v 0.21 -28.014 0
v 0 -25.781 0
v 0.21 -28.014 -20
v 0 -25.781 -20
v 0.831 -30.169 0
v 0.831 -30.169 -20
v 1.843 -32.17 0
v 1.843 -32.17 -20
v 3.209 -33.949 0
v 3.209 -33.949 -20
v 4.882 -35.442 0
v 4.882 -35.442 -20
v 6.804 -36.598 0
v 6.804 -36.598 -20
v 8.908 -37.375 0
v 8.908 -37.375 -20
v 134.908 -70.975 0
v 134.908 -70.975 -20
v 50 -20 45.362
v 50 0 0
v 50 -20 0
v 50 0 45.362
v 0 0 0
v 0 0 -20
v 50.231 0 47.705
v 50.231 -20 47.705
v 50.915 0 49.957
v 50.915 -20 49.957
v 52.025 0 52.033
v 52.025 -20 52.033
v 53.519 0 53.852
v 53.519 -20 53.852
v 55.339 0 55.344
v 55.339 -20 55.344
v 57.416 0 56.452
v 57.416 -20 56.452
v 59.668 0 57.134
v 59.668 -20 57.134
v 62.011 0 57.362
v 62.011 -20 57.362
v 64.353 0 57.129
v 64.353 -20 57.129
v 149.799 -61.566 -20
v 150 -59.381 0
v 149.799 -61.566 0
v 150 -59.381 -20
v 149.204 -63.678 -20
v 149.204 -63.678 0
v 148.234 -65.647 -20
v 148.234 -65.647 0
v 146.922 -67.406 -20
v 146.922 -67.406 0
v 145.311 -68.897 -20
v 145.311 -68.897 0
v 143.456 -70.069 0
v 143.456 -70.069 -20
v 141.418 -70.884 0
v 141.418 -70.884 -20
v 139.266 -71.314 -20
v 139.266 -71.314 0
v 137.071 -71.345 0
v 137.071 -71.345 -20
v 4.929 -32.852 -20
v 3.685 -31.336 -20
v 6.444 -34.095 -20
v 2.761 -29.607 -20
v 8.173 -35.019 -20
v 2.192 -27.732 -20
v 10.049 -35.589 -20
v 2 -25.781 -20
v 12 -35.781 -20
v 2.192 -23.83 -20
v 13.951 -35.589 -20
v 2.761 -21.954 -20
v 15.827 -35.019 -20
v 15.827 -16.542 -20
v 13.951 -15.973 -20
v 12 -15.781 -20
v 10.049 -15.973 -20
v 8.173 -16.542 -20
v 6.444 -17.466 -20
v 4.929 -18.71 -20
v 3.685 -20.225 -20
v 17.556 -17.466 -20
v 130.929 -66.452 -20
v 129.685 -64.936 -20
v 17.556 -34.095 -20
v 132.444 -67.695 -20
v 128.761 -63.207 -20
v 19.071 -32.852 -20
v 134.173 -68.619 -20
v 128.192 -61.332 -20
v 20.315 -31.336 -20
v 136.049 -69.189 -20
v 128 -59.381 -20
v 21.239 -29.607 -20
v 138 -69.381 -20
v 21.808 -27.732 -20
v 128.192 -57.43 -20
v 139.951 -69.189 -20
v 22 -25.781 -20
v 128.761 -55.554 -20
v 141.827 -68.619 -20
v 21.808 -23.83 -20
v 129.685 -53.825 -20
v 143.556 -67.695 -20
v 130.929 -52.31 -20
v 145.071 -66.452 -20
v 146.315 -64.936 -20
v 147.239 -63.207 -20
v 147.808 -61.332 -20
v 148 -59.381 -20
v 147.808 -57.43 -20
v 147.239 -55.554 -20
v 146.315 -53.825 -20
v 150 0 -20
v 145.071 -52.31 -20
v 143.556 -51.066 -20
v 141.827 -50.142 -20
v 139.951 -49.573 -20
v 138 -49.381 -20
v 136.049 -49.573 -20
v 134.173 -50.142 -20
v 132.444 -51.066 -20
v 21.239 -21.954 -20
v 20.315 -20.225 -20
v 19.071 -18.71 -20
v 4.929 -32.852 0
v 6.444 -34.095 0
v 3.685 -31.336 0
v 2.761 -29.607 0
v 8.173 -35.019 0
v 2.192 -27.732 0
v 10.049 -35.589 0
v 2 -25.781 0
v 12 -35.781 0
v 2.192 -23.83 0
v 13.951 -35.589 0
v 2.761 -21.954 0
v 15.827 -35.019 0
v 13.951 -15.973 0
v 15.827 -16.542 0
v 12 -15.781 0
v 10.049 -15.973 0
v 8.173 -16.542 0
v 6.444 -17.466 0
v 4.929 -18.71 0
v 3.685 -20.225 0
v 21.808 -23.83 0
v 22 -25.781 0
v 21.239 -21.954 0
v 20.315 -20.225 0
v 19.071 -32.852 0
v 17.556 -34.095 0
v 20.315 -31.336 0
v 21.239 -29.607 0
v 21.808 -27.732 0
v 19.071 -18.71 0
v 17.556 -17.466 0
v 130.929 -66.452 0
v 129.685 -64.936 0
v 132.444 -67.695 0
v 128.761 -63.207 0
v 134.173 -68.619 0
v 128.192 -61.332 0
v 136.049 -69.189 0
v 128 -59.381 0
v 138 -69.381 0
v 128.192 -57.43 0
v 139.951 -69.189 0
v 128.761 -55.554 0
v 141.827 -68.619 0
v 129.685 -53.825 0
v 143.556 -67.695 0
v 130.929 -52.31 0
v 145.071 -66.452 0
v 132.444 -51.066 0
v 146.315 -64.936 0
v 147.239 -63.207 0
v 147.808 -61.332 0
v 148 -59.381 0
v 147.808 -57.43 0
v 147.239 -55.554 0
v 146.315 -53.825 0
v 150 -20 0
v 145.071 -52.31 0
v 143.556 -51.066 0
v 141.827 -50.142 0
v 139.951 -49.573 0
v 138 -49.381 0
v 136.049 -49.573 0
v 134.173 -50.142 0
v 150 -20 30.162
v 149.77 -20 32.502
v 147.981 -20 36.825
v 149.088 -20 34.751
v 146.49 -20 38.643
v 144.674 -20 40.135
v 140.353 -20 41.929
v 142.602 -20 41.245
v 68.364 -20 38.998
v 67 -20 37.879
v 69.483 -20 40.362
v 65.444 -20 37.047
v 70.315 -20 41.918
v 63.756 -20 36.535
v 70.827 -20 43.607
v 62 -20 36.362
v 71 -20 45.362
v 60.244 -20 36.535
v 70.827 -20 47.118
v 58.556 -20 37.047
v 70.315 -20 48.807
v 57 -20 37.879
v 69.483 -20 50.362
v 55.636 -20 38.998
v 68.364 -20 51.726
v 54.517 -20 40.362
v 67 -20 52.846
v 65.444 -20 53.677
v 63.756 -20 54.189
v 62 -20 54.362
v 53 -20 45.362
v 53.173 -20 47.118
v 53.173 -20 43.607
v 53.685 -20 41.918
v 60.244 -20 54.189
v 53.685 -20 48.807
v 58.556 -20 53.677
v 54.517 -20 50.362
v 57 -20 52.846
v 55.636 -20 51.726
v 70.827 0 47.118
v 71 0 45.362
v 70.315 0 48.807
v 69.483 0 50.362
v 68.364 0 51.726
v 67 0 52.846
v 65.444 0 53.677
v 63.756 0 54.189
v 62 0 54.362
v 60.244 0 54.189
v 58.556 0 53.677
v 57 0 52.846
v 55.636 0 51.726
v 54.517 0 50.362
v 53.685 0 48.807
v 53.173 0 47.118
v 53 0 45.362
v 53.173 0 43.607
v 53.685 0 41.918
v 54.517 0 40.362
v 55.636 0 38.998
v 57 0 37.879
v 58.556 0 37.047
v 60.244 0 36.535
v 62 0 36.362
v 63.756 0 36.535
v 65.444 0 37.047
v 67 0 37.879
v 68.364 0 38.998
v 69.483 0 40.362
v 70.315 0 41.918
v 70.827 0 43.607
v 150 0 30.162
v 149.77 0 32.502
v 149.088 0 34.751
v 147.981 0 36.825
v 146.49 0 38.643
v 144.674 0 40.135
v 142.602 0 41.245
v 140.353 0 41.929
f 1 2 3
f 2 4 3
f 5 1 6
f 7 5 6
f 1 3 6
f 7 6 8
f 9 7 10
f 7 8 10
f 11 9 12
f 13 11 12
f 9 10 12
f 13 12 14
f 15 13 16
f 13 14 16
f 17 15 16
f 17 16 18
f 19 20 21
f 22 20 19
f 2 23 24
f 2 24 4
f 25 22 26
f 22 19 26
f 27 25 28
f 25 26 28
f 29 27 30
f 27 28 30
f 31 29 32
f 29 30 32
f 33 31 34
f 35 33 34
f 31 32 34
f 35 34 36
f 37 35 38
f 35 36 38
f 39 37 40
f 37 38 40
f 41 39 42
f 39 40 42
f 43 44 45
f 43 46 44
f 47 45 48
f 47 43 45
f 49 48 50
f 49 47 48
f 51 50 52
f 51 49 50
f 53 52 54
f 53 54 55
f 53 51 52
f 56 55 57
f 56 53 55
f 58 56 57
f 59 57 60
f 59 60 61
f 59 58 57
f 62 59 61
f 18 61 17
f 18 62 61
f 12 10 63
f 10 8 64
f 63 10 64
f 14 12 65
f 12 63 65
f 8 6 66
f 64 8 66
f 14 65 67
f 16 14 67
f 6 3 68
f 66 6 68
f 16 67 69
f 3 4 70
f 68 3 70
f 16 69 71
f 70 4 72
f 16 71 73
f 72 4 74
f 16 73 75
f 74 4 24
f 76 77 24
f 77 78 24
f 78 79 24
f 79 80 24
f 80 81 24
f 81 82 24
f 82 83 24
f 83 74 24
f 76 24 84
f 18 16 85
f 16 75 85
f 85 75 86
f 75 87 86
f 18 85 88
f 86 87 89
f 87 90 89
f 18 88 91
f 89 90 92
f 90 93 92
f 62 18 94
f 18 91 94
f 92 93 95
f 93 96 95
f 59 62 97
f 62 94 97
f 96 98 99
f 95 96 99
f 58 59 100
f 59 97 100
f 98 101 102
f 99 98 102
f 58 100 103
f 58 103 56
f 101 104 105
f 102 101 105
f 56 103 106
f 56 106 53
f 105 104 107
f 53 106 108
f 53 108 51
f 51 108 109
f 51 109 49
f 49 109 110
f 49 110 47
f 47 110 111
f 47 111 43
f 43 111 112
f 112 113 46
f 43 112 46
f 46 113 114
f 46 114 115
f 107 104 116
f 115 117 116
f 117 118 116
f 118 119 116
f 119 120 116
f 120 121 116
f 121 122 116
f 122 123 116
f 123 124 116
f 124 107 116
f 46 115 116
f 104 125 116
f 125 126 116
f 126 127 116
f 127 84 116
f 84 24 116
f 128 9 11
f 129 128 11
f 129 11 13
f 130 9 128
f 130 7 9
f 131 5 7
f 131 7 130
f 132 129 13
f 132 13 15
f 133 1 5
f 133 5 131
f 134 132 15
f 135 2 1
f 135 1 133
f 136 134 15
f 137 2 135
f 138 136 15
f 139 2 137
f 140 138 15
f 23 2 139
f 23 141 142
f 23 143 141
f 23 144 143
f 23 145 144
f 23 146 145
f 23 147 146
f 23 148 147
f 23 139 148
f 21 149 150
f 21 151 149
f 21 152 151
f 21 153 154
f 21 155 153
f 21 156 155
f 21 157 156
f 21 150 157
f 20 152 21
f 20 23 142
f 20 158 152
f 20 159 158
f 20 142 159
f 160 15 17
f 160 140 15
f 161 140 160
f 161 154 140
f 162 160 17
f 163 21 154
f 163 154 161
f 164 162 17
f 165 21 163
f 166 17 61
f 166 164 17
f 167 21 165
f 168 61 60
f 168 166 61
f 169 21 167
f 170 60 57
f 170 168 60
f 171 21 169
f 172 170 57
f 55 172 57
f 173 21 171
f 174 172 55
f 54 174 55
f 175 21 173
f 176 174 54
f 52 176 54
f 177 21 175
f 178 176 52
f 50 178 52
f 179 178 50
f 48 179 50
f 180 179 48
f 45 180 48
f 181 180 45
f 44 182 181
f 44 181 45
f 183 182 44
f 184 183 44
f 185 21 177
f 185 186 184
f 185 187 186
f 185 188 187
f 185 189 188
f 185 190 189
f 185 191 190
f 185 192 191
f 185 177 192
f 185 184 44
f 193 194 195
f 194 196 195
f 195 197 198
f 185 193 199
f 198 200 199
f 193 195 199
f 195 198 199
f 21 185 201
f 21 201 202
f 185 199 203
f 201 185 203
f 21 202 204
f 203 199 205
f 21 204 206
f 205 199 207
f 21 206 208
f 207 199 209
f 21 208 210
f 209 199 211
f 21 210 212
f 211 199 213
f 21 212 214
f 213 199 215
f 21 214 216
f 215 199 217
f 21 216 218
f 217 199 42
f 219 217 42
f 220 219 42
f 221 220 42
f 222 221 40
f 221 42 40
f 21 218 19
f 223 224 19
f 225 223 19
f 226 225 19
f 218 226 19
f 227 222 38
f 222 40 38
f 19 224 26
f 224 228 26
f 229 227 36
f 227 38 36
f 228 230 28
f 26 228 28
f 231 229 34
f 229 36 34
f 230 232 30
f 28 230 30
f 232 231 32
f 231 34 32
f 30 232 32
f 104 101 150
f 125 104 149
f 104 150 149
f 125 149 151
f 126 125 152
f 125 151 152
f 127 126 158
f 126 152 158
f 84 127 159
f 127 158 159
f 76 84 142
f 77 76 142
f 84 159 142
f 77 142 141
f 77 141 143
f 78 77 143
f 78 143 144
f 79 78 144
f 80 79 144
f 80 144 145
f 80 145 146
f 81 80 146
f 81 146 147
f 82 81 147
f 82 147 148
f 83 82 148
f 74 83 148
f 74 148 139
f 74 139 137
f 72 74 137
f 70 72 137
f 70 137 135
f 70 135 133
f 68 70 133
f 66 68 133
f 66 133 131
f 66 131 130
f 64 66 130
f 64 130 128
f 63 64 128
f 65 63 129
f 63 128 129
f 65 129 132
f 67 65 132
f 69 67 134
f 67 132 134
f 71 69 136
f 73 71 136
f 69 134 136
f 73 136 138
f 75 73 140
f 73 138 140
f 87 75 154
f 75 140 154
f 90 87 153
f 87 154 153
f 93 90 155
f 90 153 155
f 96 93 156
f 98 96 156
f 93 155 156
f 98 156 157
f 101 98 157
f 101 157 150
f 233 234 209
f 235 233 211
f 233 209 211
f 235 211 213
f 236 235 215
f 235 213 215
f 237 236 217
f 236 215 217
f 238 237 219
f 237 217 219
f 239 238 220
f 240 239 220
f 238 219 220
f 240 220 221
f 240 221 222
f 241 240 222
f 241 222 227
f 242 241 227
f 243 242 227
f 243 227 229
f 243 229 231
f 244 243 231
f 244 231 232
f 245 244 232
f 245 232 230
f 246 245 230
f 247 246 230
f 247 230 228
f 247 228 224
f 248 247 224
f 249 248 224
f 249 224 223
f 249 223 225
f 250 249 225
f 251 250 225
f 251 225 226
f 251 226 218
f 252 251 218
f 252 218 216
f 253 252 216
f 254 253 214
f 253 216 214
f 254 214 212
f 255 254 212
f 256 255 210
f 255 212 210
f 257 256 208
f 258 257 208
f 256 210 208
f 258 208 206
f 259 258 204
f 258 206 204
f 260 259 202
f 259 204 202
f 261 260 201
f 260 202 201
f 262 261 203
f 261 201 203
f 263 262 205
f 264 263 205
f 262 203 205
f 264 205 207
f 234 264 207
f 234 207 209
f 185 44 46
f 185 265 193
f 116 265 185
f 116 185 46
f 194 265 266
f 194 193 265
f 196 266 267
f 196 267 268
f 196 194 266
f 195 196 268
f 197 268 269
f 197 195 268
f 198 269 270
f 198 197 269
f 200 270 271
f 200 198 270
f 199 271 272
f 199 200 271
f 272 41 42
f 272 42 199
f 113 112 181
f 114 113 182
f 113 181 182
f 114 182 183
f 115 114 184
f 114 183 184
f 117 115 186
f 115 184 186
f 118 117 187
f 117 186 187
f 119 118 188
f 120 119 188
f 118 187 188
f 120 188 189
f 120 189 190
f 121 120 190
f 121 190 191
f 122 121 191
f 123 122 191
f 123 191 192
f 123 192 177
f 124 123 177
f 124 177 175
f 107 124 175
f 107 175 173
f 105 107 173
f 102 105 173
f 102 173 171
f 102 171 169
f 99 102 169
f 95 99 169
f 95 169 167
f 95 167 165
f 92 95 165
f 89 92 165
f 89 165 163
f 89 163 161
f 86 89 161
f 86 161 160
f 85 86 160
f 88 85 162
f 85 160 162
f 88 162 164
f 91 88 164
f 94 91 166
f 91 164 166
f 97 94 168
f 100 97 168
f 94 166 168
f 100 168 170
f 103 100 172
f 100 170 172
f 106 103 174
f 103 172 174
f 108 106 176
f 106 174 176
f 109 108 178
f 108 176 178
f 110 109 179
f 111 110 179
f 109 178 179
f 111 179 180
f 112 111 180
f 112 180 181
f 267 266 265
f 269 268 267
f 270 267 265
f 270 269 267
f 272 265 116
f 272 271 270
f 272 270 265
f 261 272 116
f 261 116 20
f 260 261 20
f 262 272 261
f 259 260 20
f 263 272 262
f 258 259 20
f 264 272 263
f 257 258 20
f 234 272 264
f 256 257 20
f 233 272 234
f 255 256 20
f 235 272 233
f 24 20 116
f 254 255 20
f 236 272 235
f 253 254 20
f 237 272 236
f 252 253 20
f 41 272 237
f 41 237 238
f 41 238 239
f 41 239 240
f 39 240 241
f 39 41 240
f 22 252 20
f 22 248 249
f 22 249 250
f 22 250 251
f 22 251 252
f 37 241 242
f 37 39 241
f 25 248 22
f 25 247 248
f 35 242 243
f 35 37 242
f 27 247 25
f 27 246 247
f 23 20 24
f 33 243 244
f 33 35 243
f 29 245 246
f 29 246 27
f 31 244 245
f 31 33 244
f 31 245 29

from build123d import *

# Parameters (mm, degrees)
F1_DEPTH  = 20
F3_DEPTH  = 20
F4_R      = 12
F5_R      = 10
F6_DEPTH  = 25
F7_R      = 10
F8_DEPTH  = 25
F9_R      = 9
F10_DEPTH = 25


with BuildPart() as f1:
    # F0 (on Top) → F1 (new body)
    with BuildSketch(Plane.XY):
        Polygon((150, 0), (0, 0), (0, -35), (150, -75), align=None)
    extrude(amount=-F1_DEPTH)

    # F2 (on face) → F3 (join)
    with BuildSketch(Plane(origin=(0, 0, 0), x_dir=(-1, 0, 0), z_dir=(0, 1, 0))):
        Polygon((-150, 40), (-150, 0), (-50, 0), (-50, 60), align=None)
    extrude(amount=-F3_DEPTH)

    # F4
    f4_edges = [f1.edges().sort_by_distance(p)[0] for p in [
        (0, -35, -10),
        (150, -75, -10),
        (50, -10, 60),
        (150, -10, 40),
    ]]
    fillet(f4_edges, radius=F4_R)

    # F5 (on face) → F6 (cut)
    with BuildSketch(Plane.XY):
        with Locations((12, -25.780660243)):
            Circle(F5_R)
    extrude(amount=-F6_DEPTH, mode=Mode.SUBTRACT)

    # F7 (on face) → F8 (cut)
    with BuildSketch(Plane.XY):
        with Locations((138, -59.380660243)):
            Circle(F7_R)
    extrude(amount=-F8_DEPTH, mode=Mode.SUBTRACT)

    # F9 (on face) → F10 (cut)
    with BuildSketch(Plane.XZ.offset(20)):
        with Locations((62, 45.3623531674)):
            Circle(F9_R)
    extrude(amount=-F10_DEPTH, mode=Mode.SUBTRACT)


solid = f1.part
